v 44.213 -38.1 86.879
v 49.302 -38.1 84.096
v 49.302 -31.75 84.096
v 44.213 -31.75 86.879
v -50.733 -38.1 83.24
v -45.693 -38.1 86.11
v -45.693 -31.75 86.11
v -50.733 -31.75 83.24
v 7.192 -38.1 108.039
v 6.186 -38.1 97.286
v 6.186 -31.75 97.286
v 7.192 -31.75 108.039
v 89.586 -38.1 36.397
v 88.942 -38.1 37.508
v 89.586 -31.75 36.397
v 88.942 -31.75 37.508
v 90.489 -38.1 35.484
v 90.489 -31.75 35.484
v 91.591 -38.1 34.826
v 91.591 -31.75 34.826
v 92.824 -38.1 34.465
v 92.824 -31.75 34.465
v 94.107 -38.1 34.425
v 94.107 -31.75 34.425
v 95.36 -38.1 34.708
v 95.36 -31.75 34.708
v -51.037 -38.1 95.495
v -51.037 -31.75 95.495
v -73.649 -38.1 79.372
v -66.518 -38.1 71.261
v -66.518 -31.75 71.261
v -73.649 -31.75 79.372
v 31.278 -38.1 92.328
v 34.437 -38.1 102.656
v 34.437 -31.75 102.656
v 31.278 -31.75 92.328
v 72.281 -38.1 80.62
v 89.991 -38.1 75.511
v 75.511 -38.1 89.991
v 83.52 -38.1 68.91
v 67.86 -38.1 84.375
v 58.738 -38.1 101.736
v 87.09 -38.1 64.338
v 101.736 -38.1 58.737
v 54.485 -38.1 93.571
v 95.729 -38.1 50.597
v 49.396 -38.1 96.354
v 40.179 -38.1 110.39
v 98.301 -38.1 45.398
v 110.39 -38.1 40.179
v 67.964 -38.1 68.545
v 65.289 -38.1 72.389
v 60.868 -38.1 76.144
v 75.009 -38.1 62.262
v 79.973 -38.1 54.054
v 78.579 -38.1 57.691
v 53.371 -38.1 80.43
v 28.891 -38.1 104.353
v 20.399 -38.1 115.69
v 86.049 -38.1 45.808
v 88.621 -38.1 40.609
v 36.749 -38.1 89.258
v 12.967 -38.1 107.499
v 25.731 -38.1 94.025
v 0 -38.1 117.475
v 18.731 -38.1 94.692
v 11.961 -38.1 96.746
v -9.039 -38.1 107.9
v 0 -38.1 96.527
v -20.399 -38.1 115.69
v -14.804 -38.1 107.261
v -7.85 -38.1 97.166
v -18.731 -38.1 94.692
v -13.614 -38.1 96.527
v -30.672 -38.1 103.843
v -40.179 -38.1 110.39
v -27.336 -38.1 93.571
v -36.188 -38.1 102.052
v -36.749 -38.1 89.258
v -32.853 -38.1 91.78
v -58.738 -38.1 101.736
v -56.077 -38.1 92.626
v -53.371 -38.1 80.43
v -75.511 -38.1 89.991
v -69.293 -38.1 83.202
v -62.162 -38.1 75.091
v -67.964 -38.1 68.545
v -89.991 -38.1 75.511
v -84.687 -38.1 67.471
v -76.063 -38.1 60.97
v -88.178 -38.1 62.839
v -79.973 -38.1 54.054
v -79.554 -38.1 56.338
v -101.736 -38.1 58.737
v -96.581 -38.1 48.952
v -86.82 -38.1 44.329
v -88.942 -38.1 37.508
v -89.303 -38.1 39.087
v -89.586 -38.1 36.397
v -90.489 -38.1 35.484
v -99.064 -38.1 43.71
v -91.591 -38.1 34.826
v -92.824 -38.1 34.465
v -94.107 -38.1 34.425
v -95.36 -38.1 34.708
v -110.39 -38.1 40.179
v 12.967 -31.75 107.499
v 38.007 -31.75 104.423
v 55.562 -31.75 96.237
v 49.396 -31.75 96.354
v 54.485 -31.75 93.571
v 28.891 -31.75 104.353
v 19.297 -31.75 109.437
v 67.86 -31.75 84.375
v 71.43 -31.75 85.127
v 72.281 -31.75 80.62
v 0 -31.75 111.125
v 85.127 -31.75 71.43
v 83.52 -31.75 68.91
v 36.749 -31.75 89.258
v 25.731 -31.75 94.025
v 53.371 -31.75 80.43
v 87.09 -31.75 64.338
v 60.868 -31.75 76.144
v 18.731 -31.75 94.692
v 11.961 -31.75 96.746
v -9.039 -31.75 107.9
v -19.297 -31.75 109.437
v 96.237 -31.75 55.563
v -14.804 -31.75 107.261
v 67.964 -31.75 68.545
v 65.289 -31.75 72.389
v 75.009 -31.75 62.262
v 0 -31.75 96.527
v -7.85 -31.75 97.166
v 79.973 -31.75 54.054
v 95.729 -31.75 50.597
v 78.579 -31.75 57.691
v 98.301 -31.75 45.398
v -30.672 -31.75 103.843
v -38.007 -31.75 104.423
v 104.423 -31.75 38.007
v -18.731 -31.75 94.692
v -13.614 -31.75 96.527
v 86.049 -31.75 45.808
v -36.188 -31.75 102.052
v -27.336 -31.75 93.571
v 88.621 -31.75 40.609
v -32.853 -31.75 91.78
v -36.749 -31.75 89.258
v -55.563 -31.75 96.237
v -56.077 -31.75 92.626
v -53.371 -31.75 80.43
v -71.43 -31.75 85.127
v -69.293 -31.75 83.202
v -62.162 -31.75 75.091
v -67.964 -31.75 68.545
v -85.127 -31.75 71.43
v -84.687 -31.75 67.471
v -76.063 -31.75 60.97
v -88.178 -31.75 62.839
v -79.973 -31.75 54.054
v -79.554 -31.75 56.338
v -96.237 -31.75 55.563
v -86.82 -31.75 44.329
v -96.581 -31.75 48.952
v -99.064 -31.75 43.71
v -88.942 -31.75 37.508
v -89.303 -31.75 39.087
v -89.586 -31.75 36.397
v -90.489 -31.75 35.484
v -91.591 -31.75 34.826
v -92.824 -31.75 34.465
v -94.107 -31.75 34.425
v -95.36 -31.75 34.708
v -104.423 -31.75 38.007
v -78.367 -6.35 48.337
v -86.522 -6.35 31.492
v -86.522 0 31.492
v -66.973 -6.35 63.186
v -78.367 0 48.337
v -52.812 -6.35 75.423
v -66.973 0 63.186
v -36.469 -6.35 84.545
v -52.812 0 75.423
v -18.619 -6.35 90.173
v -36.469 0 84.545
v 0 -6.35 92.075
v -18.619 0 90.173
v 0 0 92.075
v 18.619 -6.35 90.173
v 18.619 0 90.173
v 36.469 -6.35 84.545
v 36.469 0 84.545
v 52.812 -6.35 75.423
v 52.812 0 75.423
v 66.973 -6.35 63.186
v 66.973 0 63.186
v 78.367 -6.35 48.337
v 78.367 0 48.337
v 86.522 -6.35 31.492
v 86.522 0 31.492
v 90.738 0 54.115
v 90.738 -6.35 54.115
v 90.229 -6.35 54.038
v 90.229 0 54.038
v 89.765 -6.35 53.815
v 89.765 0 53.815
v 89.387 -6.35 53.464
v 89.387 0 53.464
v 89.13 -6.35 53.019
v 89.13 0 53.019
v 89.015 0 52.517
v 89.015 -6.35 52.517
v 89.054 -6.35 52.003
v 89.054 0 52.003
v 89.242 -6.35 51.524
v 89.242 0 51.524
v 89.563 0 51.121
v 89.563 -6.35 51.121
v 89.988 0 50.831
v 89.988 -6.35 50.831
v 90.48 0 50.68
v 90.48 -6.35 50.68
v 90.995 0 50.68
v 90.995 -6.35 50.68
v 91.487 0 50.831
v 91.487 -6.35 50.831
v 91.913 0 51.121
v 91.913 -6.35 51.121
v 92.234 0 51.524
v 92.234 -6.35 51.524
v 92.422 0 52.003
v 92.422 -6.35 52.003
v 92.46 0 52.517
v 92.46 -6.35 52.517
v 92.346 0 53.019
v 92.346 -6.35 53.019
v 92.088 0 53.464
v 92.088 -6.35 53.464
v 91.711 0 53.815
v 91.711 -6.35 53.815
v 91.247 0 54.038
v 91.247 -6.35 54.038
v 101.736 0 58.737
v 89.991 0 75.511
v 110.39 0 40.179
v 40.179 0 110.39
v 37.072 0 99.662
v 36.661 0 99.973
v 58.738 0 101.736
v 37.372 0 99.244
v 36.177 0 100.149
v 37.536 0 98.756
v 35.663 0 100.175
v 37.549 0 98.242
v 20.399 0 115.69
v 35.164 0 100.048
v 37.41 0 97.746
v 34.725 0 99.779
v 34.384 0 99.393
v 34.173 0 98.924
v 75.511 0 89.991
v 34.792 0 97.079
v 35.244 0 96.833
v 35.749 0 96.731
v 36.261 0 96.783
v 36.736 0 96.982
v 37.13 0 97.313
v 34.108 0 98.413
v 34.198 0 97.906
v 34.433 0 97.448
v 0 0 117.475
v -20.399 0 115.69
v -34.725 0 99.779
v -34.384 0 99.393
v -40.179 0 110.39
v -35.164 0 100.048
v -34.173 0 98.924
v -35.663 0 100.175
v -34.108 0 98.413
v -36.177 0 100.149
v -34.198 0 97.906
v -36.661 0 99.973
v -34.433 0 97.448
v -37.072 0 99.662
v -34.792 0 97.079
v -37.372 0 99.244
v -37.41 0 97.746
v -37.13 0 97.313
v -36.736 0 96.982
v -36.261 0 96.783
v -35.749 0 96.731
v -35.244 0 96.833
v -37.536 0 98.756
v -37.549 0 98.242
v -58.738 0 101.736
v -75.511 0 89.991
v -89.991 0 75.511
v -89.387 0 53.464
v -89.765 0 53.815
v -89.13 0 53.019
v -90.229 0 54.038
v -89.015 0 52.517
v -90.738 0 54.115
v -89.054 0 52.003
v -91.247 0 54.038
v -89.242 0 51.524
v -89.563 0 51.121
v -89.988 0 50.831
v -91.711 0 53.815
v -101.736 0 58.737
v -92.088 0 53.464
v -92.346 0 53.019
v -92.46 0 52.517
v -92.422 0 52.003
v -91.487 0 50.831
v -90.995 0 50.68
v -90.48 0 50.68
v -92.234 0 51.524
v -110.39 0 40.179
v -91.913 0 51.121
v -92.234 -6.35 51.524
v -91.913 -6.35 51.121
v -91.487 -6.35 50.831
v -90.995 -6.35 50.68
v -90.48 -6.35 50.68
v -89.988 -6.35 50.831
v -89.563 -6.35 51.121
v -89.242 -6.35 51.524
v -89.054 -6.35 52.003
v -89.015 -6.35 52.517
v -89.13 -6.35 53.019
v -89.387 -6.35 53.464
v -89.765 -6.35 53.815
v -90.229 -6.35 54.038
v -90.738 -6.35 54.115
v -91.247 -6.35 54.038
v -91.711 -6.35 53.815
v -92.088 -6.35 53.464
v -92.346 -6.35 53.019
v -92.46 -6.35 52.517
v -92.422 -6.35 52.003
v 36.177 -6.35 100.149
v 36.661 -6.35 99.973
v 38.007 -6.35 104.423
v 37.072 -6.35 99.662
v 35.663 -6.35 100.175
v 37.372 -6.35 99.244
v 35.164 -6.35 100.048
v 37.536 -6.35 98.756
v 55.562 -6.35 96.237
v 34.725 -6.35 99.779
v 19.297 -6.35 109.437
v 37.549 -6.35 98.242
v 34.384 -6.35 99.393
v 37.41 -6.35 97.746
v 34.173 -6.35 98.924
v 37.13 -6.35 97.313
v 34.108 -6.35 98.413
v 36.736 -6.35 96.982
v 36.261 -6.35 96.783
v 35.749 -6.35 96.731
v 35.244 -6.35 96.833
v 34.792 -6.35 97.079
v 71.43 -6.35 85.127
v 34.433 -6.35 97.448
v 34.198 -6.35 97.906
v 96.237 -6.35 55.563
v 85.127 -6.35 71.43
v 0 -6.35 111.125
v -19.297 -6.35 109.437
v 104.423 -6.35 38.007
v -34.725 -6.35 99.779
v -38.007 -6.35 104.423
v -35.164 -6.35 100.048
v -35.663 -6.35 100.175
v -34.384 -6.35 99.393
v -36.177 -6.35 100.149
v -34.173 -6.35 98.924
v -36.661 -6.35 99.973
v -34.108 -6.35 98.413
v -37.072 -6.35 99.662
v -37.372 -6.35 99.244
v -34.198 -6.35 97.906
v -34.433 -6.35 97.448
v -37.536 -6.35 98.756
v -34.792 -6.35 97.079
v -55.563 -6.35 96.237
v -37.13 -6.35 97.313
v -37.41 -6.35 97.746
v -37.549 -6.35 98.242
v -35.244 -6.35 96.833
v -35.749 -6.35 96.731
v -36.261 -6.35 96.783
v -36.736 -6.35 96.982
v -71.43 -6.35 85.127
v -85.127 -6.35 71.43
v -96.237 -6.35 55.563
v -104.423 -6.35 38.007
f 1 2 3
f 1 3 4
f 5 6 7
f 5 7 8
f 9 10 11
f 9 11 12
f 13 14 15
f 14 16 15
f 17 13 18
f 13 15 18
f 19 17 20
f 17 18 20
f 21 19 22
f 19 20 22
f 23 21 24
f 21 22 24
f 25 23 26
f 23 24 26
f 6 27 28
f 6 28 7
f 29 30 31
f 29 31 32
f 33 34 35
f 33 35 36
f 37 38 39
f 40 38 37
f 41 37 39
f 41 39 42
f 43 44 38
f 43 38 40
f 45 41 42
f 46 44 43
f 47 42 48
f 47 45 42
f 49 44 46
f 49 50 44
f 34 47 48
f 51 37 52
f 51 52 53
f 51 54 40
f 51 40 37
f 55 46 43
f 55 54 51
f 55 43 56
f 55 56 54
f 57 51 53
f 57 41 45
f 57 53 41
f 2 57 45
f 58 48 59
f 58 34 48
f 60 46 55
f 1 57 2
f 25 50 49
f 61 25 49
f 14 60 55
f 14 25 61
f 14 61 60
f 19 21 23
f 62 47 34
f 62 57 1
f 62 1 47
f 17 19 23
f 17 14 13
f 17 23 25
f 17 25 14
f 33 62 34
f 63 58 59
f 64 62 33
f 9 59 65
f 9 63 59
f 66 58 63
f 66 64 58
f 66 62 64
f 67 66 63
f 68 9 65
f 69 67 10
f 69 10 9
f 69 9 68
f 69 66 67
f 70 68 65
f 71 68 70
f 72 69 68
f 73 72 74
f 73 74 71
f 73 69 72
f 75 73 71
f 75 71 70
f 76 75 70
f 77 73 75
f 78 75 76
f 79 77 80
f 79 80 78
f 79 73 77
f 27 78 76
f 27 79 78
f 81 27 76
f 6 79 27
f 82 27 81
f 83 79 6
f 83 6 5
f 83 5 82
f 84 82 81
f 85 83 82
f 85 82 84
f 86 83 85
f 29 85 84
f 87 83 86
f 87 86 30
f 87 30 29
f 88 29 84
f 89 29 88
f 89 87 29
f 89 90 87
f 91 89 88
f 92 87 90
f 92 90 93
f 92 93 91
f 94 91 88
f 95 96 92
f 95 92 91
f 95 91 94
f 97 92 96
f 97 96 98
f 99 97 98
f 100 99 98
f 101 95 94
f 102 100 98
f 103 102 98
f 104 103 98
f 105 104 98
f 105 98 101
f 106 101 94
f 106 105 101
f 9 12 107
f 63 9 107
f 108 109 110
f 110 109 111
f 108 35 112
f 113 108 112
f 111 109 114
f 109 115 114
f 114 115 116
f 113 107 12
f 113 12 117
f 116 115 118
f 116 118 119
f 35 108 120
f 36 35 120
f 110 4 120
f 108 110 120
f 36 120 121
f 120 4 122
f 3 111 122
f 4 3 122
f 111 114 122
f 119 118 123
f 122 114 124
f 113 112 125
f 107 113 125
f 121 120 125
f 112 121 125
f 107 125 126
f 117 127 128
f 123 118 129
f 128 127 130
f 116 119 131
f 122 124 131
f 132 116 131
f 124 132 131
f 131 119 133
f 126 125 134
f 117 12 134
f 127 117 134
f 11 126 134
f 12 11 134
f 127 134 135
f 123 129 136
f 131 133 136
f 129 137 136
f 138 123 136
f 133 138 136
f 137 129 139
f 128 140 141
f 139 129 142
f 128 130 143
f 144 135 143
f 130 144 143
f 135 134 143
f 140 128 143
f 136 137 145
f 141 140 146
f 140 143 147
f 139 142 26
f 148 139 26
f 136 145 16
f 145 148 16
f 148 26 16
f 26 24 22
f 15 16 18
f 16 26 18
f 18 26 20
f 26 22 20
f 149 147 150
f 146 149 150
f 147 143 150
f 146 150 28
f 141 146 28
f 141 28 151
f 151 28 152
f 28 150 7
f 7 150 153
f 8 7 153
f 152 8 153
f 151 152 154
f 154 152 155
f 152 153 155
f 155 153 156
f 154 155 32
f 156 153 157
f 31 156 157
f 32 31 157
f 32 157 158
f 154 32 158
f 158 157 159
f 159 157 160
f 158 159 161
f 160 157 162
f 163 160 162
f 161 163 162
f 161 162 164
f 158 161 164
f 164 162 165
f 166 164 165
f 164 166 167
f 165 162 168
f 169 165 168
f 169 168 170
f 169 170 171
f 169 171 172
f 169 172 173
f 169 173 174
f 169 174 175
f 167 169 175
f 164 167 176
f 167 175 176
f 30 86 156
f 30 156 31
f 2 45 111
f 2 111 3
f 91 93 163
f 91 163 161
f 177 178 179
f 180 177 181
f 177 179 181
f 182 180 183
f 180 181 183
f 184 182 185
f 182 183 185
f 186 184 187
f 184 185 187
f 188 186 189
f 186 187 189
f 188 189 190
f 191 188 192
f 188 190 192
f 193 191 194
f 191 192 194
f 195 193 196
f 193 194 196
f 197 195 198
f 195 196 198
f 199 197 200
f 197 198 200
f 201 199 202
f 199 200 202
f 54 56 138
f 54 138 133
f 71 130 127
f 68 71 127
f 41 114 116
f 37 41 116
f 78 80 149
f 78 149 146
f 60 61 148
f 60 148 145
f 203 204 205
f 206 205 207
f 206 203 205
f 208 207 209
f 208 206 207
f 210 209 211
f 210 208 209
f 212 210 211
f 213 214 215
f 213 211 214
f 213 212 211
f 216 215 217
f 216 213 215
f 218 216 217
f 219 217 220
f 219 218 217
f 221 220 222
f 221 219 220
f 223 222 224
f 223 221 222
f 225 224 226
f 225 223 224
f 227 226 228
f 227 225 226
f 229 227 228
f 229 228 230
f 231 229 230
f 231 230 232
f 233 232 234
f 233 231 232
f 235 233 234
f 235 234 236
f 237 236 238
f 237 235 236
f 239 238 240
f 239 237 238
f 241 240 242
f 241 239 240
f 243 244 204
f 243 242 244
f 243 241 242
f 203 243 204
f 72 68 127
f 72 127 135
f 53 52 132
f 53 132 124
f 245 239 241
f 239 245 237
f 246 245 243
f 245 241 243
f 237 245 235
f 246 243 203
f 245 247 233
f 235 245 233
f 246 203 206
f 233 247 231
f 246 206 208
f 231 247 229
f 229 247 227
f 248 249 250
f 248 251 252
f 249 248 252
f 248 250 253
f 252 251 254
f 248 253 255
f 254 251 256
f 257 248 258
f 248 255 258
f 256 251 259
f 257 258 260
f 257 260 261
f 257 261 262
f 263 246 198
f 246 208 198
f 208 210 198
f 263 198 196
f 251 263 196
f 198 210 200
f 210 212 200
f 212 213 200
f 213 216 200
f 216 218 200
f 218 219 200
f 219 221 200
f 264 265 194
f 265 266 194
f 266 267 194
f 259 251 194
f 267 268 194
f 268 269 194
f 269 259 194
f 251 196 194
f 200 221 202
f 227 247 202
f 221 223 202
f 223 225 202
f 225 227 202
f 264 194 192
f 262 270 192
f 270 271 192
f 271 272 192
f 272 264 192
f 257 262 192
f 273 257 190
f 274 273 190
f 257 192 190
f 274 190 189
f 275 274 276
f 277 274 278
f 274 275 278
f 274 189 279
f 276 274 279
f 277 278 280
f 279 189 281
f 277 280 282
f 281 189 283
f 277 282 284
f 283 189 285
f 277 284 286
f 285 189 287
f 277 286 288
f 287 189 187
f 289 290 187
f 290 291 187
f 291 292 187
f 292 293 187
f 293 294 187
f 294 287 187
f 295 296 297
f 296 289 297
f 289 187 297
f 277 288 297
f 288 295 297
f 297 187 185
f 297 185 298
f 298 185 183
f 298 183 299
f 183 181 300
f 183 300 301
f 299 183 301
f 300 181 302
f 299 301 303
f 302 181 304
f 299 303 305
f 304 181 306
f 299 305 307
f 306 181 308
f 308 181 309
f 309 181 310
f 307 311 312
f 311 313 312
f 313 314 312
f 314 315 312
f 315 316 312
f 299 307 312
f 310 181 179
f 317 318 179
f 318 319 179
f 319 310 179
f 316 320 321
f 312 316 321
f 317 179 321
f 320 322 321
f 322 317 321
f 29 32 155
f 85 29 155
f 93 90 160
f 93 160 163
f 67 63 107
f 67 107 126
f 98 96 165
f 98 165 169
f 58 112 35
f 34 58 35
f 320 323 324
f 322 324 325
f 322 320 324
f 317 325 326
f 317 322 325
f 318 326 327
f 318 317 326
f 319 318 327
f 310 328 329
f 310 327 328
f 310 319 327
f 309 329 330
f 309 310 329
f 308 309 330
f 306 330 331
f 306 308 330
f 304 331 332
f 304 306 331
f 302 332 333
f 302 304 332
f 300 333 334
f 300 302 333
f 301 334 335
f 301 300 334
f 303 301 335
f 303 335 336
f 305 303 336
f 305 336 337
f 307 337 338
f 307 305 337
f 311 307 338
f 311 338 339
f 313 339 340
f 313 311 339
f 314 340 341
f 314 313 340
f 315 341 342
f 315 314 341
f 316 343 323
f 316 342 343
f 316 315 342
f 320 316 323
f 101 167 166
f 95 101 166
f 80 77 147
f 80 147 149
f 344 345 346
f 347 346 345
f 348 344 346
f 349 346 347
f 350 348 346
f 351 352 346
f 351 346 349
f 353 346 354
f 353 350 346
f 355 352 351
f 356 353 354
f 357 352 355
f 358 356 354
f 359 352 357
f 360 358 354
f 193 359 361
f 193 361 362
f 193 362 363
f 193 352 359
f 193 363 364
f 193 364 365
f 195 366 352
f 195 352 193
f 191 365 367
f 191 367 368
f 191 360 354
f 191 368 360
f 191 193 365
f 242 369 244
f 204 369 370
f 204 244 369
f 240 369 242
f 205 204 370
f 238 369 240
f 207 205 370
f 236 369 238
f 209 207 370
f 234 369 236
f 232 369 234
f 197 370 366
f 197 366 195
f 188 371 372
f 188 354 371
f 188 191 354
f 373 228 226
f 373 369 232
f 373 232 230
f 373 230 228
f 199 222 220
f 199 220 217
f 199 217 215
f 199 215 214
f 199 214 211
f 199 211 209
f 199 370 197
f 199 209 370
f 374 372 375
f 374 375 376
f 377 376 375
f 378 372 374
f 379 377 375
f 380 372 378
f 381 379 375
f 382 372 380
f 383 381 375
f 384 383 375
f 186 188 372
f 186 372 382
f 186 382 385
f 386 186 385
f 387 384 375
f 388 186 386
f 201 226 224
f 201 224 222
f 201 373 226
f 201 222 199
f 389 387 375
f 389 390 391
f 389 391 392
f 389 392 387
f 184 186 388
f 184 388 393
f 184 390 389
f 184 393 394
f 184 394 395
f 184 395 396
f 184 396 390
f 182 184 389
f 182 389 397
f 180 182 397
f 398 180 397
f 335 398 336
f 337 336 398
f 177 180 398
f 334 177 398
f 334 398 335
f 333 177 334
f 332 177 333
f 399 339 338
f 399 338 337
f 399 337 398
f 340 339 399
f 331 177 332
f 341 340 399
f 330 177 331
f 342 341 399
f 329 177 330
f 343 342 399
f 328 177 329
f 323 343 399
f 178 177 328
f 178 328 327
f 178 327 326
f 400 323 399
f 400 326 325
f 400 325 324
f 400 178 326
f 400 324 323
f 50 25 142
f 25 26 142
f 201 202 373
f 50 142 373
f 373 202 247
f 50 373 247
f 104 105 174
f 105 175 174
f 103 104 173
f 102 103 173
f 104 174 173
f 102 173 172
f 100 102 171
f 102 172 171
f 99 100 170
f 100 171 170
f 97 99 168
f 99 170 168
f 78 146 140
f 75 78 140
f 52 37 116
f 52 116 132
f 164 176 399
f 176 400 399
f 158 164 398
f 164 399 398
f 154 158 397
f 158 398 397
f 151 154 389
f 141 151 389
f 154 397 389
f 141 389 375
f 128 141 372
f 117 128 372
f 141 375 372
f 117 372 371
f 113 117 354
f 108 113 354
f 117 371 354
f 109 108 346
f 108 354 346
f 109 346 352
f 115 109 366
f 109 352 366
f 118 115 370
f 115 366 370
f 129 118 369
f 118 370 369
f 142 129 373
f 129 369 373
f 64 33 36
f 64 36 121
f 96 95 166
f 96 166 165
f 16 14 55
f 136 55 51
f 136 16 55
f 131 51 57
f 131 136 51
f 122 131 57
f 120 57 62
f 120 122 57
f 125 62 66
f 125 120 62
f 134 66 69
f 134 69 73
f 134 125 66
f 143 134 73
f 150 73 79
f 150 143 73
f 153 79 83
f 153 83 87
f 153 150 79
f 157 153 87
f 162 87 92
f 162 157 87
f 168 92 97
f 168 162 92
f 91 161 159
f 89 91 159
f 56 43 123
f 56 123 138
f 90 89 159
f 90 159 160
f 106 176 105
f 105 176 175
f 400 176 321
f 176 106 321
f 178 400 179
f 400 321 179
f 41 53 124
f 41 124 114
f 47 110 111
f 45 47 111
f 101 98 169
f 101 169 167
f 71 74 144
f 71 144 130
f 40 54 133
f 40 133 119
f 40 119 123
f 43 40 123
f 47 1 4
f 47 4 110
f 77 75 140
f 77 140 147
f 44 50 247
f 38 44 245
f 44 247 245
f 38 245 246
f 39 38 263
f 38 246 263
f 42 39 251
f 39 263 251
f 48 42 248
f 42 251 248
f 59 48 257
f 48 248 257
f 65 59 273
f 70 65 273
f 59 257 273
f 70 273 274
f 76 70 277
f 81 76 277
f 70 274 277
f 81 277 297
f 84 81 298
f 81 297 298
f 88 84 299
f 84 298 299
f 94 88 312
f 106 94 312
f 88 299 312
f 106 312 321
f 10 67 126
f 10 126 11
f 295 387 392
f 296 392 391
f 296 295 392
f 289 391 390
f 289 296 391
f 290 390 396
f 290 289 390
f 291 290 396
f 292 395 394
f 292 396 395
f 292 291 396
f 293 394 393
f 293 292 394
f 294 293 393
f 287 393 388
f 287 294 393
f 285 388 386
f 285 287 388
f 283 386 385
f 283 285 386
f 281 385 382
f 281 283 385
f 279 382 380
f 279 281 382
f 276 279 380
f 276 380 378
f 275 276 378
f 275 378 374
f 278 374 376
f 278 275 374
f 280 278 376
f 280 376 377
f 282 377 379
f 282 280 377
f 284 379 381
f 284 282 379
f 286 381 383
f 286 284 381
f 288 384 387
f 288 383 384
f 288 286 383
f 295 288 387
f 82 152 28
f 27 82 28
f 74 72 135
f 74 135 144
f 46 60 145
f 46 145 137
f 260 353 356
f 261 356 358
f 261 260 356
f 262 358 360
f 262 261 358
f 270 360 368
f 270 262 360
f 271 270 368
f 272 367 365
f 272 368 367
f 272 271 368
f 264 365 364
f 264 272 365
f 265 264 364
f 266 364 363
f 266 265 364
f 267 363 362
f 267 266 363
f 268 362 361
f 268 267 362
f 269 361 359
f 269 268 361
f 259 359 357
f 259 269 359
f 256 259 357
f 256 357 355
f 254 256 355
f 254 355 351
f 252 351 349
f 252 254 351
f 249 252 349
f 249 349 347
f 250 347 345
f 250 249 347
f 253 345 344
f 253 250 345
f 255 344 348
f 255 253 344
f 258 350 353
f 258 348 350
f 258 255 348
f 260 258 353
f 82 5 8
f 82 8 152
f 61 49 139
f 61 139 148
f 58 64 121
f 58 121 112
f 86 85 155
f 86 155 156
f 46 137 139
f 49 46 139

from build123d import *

# Parameters (mm, degrees)
BOSS_EXTRUDE1_DEPTH = 38.1
SKETCH4_W           = 19.05
SKETCH4_H           = 25.4
CUT_EXTRUDE1_START  = -6.35
CUT_EXTRUDE1_DEPTH  = 6.35
CIRPATTERN1_COUNT   = 13
CIRPATTERN1_ANGLE   = 140
CIRPATTERN2_COUNT   = 4
CIRPATTERN2_ANGLE   = 120
SKETCH13_W          = 4.452036414
SKETCH13_H          = 6.35
CUT_REVOLVE2_ANGLE  = 145
FILLET1_R           = 5.08


with BuildPart() as part:
    # Sketch1 → Boss-Extrude1 (new body)
    with BuildSketch(Plane(origin=(0, 0, 0), x_dir=(1, 0, 0), z_dir=(0, 1, 0))):
        with BuildLine():
            Line((-110.390390627, -40.178816337), (-86.522198059, -31.491504697))
            ThreePointArc((-86.522198059, -31.491504697), (0, -92.075), (86.522198059, -31.491504697))
            Line((86.522198059, -31.491504697), (110.390390627, -40.178816337))
            ThreePointArc((110.390390627, -40.178816337), (0, -117.475), (-110.390390627, -40.178816337))
        make_face()
    extrude(amount=-BOSS_EXTRUDE1_DEPTH)

    # Sketch4 → Cut-Revolve1 (revolve, cut)
    with BuildSketch(Plane(origin=(86.522198059, 0, 31.491504697), x_dir=(0.9396926207859084, 0, 0.34202014332566905), z_dir=(-0.34202014332566905, 0, 0.9396926207859084))):
        with Locations((9.525, -19.05)):
            Rectangle(SKETCH4_W, SKETCH4_H)
    revolve(axis=Axis((0, -38.1, 0), (0, 1, 0)), mode=Mode.SUBTRACT)

    # Sketch5 → Cut-Extrude1 (cut)
    with BuildSketch(Plane(origin=(0, -31.75, 0), x_dir=(1, 0, 0), z_dir=(0, 1, 0)).offset(CUT_EXTRUDE1_START)):
        Polygon((98.301392685, -45.398059752), (88.621295381, -40.60893497), (86.049357998, -45.807505744), (95.729455302, -50.596630526), align=None)
    cut_extrude1 = extrude(amount=CUT_EXTRUDE1_DEPTH, mode=Mode.SUBTRACT)

    # CirPattern1: Cut-Extrude1 ×13 about axis
    cirpattern1_axis = Axis((0, 0, 0), (0, -1, 0))
    for i in range(1, CIRPATTERN1_COUNT):
        add(cut_extrude1.rotate(cirpattern1_axis, i * CIRPATTERN1_ANGLE / (CIRPATTERN1_COUNT - 1)), mode=Mode.SUBTRACT)

    # Sketch11 → #8-32 Tapped Hole1 (revolve, cut)
    with BuildSketch(Plane(origin=(90.737811682, 0, 52.3875), x_dir=(0, 0, 1), z_dir=(1, 0, 0))):
        Polygon((0, 0), (0, 11.705806461), (1.7272, 10.668), (1.7272, 0), align=None)
    f_8_32_tapped_hole1 = revolve(axis=Axis((90.737811682, 6.35, 52.3875), (0, -1, 0)), mode=Mode.SUBTRACT)

    # CirPattern2: #8-32 Tapped Hole1 ×4 about axis
    cirpattern2_axis = Axis((0, 0, 0), (0, -1, 0))
    for i in range(1, CIRPATTERN2_COUNT):
        add(f_8_32_tapped_hole1.rotate(cirpattern2_axis, i * CIRPATTERN2_ANGLE / (CIRPATTERN2_COUNT - 1)), mode=Mode.SUBTRACT)

    # Sketch13 → Cut-Revolve2 (revolve, cut)
    with BuildSketch(Plane(origin=(0, 0, 0), x_dir=(-0.9396926207859083, 0, -0.3420201433256694), z_dir=(0.3420201433256694, 0, -0.9396926207859083))):
        with Locations((-94.301018207, -34.925)):
            Rectangle(SKETCH13_W, SKETCH13_H)
    revolve(axis=Axis((0, -38.1, 0), (0, -1, 0)), revolution_arc=CUT_REVOLVE2_ANGLE, mode=Mode.SUBTRACT)

    # Fillet1
    fillet1_edges = [part.edges().sort_by_distance(p)[0] for p in [
        (-90.705743825, -34.925, 33.014190829),
        (90.705743825, -34.925, 33.014190829),
    ]]
    fillet(fillet1_edges, radius=FILLET1_R)


solid = part.part
